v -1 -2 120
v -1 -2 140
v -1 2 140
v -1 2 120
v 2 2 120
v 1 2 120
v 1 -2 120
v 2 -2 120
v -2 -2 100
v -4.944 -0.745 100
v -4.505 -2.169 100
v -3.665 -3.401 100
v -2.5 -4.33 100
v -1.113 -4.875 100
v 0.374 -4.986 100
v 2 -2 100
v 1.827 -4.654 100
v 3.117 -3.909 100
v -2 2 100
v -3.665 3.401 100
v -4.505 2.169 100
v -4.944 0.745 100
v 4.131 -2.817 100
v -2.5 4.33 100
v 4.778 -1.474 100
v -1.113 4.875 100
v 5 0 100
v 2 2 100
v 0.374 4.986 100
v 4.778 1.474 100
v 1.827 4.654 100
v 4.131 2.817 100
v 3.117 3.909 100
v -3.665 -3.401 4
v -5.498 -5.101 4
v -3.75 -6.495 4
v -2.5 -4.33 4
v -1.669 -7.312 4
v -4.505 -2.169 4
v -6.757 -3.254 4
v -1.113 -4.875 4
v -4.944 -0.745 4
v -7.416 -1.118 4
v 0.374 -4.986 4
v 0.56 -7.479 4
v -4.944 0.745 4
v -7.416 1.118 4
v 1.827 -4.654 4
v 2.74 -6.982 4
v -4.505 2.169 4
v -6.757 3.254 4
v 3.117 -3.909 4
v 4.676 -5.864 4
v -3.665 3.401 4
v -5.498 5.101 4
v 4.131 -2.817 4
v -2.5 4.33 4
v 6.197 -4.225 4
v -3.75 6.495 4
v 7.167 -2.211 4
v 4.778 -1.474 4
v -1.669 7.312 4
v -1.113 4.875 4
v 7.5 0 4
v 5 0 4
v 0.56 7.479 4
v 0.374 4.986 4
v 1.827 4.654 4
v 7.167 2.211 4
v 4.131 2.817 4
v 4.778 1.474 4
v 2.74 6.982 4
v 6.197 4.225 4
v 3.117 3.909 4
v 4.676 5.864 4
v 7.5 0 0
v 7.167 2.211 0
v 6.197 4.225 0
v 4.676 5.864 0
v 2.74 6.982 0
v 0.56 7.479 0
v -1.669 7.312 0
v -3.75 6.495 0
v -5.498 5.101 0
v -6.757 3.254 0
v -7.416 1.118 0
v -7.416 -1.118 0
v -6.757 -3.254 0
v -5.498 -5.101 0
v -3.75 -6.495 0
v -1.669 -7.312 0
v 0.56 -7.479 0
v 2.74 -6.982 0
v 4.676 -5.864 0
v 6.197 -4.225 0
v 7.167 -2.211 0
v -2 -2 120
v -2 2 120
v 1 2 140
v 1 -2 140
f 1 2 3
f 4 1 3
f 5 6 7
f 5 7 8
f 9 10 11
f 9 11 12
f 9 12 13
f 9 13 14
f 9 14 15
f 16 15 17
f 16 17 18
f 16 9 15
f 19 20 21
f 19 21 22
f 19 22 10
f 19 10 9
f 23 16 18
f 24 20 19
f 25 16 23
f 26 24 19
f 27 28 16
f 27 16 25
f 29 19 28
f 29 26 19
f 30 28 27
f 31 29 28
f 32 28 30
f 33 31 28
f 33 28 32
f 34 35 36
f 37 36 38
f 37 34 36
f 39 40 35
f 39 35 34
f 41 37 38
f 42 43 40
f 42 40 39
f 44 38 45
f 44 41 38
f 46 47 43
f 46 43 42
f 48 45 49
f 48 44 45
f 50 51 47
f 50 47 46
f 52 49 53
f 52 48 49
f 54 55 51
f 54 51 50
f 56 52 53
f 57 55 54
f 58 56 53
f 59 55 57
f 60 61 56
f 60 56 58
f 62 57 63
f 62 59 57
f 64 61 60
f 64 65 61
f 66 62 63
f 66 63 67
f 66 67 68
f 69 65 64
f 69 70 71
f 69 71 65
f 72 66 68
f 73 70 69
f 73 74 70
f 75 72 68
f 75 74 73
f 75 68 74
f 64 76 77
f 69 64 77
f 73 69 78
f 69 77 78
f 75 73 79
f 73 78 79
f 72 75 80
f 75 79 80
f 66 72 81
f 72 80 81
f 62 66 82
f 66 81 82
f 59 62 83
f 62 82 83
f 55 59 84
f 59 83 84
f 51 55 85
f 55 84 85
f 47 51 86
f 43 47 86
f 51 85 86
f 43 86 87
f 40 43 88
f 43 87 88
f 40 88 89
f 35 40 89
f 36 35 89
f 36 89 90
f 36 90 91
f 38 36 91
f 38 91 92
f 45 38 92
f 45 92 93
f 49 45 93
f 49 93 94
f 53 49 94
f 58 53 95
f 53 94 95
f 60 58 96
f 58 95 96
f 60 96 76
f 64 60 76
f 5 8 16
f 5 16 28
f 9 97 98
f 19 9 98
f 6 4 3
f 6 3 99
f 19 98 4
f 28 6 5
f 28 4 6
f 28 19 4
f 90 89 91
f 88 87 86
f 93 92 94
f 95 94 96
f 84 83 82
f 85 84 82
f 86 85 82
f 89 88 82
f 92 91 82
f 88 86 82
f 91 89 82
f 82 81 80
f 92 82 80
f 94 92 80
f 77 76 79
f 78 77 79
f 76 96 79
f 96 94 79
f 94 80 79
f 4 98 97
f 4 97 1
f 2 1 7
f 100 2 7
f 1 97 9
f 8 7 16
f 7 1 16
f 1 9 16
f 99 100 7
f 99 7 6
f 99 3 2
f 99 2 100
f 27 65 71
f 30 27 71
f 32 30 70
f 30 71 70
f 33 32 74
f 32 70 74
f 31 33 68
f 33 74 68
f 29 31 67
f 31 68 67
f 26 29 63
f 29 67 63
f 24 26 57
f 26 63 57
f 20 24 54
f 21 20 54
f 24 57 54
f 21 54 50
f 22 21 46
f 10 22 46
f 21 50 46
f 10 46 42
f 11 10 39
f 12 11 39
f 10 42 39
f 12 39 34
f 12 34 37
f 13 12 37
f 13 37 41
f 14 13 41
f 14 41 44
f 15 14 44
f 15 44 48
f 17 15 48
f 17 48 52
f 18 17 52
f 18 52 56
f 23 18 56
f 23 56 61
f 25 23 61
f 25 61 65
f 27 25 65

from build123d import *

# Parameters (mm, degrees)
F0_R     = 7.5
F1_DEPTH = 4
F2_R     = 5
F3_DEPTH = 100
F4_W     = 4
F4_H     = 4
F5_DEPTH = 20
F6_W     = 2
F6_H     = 4
F7_DEPTH = 20


with BuildPart() as f1:
    # F0 (on Top) → F1 (new body)
    with BuildSketch(Plane.XY):
        Circle(F0_R)
    extrude(amount=F1_DEPTH)

    # F2 (on Top) → F3 (join)
    with BuildSketch(Plane.XY):
        Circle(F2_R)
    extrude(amount=F3_DEPTH)

    # F4 (on face) → F5 (join)
    with BuildSketch(Plane.XY.offset(100)):
        Rectangle(F4_W, F4_H)
    extrude(amount=F5_DEPTH)

    # F6 (on face) → F7 (join)
    with BuildSketch(Plane.XY.offset(120)):
        Rectangle(F6_W, F6_H)
    extrude(amount=F7_DEPTH)


solid = f1.part
